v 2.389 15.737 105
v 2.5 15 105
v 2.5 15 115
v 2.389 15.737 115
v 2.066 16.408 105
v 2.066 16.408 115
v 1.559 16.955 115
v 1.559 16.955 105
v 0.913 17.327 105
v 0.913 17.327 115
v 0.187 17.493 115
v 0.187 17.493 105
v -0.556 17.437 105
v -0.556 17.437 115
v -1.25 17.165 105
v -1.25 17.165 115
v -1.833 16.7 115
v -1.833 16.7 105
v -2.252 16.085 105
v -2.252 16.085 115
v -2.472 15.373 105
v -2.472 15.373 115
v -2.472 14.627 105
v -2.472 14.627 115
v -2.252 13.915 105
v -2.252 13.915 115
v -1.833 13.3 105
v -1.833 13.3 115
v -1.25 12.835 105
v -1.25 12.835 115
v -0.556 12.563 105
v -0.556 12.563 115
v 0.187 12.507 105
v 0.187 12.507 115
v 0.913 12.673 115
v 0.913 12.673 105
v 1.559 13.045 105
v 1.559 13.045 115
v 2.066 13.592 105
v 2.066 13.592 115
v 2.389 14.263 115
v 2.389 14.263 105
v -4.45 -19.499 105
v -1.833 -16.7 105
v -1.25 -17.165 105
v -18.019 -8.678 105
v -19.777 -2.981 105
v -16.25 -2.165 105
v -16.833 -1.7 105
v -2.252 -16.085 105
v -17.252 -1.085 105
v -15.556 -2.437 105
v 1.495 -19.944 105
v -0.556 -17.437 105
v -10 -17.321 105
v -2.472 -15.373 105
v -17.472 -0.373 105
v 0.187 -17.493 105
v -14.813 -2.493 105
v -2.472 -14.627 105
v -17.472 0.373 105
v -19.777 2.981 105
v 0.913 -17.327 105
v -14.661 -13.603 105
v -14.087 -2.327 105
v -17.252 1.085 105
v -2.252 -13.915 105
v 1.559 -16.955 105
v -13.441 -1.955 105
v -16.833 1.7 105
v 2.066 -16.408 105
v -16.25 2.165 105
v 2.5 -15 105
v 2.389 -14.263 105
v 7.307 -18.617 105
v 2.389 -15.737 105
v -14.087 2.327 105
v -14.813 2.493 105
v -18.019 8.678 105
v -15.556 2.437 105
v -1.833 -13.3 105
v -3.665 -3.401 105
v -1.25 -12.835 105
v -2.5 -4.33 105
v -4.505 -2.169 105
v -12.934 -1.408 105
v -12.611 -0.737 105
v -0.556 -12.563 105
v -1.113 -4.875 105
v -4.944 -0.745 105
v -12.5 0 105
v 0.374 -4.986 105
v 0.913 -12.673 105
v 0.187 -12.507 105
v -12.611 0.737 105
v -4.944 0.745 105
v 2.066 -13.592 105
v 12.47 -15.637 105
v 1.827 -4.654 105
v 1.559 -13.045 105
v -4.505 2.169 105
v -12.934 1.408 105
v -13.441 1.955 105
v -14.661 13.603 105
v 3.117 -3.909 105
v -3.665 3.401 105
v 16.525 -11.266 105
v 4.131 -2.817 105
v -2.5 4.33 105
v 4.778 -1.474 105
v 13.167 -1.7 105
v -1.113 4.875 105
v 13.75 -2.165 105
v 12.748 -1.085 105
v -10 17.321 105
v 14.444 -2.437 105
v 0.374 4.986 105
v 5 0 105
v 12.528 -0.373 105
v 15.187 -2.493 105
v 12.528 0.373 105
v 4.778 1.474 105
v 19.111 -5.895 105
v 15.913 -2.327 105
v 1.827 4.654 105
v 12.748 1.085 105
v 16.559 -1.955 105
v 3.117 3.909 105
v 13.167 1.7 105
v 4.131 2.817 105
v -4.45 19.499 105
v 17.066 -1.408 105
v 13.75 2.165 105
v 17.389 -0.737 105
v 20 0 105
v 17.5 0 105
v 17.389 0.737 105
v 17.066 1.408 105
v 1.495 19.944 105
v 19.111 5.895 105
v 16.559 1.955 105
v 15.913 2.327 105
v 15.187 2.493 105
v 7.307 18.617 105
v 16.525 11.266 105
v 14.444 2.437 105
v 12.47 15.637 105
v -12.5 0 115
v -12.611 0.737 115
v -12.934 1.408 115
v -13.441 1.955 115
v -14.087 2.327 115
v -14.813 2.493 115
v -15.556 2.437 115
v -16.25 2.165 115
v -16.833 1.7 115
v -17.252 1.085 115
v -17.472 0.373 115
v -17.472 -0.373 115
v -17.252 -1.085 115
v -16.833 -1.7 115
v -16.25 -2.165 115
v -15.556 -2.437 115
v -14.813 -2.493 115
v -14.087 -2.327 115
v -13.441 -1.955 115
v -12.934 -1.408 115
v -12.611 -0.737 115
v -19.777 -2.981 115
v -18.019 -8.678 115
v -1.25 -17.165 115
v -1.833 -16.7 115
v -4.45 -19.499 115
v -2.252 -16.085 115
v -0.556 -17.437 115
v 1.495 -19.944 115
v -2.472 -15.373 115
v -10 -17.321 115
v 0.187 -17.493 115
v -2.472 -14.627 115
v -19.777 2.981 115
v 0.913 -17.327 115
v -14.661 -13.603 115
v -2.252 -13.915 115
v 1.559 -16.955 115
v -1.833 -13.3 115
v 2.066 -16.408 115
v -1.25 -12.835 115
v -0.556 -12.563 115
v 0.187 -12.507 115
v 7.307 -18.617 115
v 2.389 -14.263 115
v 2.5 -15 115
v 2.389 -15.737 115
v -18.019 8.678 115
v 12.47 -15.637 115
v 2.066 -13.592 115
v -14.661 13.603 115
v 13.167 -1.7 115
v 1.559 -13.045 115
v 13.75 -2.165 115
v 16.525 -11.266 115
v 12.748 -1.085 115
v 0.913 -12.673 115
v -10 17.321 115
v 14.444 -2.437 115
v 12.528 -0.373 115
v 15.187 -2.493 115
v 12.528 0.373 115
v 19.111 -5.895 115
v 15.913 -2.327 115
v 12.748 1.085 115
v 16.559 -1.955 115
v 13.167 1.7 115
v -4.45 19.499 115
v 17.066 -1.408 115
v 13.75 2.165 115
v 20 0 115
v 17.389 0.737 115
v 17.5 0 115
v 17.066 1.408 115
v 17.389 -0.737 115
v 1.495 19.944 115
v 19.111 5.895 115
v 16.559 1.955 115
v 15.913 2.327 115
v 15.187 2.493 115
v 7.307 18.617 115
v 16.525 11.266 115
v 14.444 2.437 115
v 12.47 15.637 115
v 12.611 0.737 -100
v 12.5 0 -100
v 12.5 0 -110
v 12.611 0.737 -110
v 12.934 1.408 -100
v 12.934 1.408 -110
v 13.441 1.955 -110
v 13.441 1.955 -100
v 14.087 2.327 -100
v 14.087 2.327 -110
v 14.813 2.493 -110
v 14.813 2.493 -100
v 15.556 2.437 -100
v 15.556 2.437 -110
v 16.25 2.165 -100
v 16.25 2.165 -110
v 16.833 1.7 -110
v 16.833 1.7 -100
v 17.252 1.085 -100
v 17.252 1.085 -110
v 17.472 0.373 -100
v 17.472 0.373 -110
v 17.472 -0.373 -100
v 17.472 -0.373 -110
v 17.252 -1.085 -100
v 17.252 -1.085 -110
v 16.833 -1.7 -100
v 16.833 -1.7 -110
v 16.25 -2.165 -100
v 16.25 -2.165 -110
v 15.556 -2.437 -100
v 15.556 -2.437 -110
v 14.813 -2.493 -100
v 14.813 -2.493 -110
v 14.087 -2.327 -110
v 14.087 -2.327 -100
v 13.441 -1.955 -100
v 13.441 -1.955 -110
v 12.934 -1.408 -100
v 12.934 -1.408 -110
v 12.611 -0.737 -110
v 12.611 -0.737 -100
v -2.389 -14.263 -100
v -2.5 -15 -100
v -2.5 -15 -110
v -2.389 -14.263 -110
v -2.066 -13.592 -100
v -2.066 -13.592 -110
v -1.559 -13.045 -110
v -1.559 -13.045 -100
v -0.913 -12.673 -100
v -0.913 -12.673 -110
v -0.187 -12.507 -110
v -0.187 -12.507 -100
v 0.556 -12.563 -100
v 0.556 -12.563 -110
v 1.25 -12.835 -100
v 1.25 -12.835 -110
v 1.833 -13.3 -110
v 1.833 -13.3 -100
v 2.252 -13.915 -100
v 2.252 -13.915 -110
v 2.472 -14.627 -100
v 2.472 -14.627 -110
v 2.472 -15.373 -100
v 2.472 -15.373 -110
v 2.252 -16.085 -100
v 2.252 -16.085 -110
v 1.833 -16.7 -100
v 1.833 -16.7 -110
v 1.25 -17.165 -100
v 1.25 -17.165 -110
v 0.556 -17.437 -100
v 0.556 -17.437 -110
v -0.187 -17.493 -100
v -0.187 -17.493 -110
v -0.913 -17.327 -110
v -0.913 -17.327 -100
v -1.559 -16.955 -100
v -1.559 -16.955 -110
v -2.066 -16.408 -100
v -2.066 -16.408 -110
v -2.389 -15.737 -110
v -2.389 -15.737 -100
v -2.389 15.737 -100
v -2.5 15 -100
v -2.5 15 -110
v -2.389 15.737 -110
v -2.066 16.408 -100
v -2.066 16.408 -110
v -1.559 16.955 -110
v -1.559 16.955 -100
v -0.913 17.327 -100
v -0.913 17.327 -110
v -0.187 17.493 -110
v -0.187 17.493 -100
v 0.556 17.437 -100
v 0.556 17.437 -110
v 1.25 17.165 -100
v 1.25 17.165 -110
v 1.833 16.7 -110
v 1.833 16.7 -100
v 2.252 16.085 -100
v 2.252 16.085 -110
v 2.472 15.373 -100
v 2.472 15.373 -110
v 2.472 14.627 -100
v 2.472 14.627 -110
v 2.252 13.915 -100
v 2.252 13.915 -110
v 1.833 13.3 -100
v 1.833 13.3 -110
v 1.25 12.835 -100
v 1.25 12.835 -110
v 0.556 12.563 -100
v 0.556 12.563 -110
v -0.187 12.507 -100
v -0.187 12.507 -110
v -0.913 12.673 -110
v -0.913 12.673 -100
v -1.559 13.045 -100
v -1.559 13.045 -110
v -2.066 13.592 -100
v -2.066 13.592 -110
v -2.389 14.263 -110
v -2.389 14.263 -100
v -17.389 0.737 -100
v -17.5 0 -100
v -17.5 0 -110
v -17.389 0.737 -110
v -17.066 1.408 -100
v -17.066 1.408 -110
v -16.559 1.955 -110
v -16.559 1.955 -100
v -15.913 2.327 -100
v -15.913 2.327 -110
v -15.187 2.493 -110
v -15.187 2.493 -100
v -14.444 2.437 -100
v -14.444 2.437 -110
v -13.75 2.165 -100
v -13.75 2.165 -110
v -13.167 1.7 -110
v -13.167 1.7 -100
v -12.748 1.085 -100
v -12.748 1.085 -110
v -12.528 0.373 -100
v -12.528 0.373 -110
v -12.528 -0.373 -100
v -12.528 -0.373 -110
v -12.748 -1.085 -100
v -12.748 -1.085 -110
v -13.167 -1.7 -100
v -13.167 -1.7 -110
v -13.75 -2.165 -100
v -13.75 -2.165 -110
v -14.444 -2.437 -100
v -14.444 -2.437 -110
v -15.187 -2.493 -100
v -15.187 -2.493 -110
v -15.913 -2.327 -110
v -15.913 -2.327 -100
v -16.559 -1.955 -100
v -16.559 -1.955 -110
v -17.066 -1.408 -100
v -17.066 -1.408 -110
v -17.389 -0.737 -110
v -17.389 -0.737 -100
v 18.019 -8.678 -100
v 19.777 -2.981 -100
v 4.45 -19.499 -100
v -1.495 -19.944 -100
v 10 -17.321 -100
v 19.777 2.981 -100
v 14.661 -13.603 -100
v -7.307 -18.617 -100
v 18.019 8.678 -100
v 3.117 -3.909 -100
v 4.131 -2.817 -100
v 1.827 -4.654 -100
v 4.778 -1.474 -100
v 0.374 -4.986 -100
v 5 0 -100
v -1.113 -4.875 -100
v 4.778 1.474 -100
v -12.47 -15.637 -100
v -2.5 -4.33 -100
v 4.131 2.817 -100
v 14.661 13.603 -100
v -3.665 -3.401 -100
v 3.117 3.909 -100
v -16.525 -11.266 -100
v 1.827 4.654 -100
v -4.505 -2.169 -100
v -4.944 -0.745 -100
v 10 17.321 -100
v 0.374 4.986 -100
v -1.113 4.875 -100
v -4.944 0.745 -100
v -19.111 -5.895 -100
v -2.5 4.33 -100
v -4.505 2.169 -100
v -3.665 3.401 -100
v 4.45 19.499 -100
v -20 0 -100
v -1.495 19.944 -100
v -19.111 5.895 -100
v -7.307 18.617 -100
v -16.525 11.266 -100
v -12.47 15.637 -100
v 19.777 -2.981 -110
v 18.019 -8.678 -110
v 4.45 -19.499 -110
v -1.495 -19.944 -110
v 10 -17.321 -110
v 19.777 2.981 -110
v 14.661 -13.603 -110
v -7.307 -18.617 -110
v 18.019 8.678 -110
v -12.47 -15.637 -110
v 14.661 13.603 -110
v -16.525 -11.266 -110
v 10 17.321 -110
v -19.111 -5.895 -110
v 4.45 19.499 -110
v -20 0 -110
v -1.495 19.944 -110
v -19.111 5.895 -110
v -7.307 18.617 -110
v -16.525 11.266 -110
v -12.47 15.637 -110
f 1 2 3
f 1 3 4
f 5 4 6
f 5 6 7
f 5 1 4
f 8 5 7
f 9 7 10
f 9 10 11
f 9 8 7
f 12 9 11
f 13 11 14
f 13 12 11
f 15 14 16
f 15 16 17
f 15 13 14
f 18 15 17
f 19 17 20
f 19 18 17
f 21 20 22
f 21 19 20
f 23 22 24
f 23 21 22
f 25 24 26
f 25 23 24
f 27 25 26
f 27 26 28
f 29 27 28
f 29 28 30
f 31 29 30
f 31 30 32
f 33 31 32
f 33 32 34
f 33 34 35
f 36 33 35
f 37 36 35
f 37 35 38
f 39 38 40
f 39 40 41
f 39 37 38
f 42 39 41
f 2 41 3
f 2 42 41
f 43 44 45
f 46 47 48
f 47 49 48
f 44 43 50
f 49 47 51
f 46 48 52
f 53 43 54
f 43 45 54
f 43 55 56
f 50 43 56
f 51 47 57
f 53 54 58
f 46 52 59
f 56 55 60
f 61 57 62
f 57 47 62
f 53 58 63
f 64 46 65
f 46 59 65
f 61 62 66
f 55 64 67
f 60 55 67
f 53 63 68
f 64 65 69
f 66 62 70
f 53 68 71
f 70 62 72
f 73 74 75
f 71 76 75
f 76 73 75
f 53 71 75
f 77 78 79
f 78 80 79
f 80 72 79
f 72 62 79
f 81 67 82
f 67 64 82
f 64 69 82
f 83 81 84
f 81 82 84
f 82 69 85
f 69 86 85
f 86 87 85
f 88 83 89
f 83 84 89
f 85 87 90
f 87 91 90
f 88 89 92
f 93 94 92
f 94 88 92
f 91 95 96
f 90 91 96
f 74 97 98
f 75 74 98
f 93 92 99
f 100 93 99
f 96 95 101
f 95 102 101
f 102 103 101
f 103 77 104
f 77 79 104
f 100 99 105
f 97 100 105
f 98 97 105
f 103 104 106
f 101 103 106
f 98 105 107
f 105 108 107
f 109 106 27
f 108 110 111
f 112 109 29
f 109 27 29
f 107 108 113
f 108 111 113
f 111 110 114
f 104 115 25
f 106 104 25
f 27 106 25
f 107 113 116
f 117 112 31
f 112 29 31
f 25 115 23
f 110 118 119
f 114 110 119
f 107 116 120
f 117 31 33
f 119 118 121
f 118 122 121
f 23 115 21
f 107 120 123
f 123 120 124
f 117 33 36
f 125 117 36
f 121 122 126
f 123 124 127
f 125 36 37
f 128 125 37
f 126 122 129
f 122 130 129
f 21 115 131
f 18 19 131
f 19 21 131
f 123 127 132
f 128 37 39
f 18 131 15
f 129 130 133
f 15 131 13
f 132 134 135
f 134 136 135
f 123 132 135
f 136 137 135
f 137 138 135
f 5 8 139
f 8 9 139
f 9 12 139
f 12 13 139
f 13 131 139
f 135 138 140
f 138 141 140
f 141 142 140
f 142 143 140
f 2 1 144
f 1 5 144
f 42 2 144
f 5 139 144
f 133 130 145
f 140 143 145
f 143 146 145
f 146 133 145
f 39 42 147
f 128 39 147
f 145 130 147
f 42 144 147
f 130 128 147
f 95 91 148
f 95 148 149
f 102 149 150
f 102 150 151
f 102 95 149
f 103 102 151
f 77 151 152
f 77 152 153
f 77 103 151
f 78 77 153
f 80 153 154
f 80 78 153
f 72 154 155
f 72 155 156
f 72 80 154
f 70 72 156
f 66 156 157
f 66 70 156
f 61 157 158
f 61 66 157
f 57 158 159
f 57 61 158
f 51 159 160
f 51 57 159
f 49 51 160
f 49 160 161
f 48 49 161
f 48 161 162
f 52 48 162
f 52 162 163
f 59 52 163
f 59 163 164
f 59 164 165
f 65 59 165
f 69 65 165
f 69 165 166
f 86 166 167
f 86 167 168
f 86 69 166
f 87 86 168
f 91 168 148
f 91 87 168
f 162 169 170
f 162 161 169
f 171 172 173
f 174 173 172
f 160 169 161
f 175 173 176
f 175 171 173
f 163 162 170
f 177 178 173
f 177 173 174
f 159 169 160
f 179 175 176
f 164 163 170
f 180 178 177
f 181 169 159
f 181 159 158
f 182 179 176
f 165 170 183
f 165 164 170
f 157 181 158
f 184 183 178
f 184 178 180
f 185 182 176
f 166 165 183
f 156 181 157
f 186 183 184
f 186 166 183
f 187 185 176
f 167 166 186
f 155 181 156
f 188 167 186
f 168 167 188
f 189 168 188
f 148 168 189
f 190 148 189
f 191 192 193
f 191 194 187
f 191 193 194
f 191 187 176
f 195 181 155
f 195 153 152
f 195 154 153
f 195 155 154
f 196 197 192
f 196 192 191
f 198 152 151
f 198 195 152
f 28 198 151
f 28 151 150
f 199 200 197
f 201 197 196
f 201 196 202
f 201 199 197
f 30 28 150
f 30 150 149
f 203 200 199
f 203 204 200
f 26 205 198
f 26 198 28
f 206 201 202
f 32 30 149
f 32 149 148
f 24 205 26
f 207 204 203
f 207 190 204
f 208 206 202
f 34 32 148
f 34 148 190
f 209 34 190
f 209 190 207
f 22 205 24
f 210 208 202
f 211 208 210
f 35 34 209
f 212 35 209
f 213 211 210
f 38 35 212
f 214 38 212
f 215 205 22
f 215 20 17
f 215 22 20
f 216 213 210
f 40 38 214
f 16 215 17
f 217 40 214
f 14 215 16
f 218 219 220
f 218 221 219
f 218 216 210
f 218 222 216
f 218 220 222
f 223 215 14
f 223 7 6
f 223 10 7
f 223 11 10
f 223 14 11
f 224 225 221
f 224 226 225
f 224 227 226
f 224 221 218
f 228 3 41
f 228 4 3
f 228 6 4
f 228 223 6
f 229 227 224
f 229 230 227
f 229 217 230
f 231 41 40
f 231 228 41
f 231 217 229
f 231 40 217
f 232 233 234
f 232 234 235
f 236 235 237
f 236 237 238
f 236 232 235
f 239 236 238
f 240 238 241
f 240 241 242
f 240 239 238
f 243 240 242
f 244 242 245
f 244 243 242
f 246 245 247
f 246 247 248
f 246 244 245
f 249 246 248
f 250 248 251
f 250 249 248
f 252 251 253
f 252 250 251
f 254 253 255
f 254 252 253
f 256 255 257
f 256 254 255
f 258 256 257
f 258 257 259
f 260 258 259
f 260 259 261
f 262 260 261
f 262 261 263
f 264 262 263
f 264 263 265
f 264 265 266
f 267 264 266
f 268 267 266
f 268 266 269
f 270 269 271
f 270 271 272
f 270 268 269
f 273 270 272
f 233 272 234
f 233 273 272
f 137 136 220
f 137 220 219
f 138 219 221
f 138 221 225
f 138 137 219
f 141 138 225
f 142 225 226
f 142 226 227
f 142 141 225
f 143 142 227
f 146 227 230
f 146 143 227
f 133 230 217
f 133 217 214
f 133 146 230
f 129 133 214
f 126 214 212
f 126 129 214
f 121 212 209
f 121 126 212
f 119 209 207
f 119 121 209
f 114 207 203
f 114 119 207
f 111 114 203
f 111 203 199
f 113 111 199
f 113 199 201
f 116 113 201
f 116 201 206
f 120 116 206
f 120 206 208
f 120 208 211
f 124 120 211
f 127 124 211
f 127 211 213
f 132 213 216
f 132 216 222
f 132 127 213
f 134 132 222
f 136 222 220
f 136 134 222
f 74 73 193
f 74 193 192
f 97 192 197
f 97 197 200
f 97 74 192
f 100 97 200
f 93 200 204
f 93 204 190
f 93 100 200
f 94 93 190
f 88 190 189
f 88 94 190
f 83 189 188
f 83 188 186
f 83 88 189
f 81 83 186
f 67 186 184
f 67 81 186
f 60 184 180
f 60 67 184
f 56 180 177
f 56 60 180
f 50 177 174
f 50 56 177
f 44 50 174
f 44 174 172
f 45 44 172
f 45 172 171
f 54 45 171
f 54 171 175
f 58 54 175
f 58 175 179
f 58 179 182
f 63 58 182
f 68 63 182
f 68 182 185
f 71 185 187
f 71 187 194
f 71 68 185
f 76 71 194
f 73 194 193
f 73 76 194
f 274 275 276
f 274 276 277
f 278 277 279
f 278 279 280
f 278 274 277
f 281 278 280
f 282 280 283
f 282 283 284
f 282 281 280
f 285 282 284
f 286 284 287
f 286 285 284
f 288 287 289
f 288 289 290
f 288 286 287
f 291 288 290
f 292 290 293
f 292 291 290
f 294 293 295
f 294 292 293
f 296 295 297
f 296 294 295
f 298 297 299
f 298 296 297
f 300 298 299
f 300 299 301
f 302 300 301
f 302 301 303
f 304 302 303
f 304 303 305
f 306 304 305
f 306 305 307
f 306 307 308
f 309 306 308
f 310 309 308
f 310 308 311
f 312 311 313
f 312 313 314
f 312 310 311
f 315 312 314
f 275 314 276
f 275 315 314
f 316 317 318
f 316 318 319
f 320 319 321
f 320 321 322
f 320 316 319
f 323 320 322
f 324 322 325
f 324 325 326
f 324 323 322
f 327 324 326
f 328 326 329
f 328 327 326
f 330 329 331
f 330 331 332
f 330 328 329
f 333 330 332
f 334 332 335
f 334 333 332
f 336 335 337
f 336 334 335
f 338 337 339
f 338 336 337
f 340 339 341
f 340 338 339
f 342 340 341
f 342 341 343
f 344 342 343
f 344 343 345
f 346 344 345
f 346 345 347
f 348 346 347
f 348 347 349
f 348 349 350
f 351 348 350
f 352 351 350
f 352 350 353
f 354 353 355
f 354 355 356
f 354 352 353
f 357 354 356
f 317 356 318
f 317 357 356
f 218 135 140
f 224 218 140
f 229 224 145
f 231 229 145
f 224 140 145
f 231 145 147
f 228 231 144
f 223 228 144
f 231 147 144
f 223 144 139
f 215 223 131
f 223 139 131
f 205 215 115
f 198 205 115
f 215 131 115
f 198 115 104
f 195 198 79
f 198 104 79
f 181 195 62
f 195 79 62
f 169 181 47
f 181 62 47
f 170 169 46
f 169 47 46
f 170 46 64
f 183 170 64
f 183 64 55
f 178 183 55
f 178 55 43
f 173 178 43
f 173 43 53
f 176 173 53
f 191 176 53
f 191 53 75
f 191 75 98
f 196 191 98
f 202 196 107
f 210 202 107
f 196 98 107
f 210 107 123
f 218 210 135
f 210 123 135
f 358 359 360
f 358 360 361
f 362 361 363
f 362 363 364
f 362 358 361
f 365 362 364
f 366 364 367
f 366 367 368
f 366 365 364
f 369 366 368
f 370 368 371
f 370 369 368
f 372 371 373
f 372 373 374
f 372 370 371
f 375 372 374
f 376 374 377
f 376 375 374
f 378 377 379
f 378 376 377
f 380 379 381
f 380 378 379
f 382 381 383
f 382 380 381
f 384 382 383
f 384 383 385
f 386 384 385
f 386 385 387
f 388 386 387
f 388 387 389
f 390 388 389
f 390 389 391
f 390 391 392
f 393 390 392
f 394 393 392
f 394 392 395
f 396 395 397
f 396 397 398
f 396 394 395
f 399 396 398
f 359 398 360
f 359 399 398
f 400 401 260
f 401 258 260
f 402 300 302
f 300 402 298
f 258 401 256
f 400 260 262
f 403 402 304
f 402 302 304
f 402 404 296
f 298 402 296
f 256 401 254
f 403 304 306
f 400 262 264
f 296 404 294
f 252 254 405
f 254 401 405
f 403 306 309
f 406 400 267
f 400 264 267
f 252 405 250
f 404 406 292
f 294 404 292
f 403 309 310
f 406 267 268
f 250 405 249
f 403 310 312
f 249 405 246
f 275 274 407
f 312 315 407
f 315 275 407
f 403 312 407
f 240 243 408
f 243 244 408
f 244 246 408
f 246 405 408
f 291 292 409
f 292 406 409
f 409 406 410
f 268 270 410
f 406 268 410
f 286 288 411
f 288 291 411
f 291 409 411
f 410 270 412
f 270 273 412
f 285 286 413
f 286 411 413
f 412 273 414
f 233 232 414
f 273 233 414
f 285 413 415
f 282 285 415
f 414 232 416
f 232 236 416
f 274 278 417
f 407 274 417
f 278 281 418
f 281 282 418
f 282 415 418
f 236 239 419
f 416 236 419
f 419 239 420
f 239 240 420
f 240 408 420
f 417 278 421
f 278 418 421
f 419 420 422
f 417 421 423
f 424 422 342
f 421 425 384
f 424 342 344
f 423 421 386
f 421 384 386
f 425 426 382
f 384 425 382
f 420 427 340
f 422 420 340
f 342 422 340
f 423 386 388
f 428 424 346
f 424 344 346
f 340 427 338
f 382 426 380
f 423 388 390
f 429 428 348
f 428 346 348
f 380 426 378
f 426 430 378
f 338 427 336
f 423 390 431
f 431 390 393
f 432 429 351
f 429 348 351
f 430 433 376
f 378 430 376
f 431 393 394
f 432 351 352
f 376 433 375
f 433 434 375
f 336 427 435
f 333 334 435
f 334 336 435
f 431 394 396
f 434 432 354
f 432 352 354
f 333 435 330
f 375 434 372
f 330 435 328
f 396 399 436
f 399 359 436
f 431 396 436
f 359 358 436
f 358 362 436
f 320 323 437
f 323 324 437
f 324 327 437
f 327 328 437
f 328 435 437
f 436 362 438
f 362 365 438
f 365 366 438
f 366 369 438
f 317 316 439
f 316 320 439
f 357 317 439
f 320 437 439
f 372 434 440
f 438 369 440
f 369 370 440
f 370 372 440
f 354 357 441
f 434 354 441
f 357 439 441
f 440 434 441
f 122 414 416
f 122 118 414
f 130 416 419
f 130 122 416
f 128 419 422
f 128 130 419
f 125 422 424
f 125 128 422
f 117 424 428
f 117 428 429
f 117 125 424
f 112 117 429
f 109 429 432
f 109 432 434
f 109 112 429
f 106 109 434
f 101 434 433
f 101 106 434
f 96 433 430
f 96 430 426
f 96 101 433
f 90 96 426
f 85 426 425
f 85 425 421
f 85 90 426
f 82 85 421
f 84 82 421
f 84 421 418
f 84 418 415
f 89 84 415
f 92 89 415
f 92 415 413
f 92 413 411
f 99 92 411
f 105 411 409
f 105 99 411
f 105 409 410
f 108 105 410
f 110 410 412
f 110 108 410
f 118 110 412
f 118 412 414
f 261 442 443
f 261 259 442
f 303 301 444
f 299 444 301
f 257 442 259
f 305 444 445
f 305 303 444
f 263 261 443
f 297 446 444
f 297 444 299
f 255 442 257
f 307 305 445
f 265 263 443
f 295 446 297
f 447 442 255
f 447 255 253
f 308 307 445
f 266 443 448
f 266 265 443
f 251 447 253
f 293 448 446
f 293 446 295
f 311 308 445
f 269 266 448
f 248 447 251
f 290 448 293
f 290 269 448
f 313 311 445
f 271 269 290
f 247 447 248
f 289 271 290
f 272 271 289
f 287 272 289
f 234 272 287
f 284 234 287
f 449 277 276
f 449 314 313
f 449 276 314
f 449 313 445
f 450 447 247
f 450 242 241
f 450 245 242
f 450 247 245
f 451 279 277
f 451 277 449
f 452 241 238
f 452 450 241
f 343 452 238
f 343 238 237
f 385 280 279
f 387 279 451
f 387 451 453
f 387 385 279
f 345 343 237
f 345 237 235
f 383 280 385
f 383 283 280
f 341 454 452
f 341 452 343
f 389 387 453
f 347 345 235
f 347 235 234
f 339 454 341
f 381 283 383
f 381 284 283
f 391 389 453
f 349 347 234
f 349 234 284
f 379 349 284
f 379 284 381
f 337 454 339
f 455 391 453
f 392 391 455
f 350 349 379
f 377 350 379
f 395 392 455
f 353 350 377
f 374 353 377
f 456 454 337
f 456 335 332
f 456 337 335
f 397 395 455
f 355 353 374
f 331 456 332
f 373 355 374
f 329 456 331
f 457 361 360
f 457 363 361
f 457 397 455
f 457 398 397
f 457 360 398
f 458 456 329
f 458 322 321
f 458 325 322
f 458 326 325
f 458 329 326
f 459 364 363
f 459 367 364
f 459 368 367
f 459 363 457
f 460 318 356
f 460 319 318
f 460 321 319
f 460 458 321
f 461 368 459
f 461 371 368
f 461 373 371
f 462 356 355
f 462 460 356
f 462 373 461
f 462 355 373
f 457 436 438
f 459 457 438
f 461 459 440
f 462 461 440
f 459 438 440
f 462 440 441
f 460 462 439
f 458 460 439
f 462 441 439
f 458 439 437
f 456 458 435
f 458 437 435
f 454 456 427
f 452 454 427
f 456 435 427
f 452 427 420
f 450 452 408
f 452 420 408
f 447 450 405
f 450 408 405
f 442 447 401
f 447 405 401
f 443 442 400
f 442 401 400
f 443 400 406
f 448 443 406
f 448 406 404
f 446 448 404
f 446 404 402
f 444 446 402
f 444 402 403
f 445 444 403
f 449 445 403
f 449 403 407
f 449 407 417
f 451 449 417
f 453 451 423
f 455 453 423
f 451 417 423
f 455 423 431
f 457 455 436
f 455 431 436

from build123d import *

# Parameters (mm, degrees)
SKETCH1_R                = 5
BOSS_EXTRUDE1_DEPTH      = 105
BOSS_EXTRUDE1_DEPTH_BACK = 100
SKETCH2_R                = 20
SKETCH2_R_2              = 2.5
BOSS_EXTRUDE2_DEPTH      = 10
SKETCH3_R                = 20
SKETCH3_R_2              = 2.5
BOSS_EXTRUDE3_DEPTH      = 10


with BuildPart() as part:
    # Sketch1 → Boss-Extrude1 (new body, two sides)
    with BuildSketch(Plane.XY) as boss_extrude1_sk:
        Circle(SKETCH1_R)
    extrude(amount=BOSS_EXTRUDE1_DEPTH)
    extrude(boss_extrude1_sk.sketch, amount=-BOSS_EXTRUDE1_DEPTH_BACK)

    # Sketch2 → Boss-Extrude2 (add)
    with BuildSketch(Plane.XY.offset(105)):
        Circle(SKETCH2_R)
        with Locations((0, 15)):
            Circle(SKETCH2_R_2, mode=Mode.SUBTRACT)
        with Locations((15, 0)):
            Circle(SKETCH2_R_2, mode=Mode.SUBTRACT)
        with Locations((0, -15)):
            Circle(SKETCH2_R_2, mode=Mode.SUBTRACT)
        with Locations((-15, 0)):
            Circle(SKETCH2_R_2, mode=Mode.SUBTRACT)
    extrude(amount=BOSS_EXTRUDE2_DEPTH)

    # Sketch3 → Boss-Extrude3 (add)
    with BuildSketch(Plane(origin=(0, 0, -100), x_dir=(-1, 0, 0), z_dir=(0, 0, -1))):
        Circle(SKETCH3_R)
        with Locations((0, 15)):
            Circle(SKETCH3_R_2, mode=Mode.SUBTRACT)
        with Locations((-15, 0)):
            Circle(SKETCH3_R_2, mode=Mode.SUBTRACT)
        with Locations((0, -15)):
            Circle(SKETCH3_R_2, mode=Mode.SUBTRACT)
        with Locations((15, 0)):
            Circle(SKETCH3_R_2, mode=Mode.SUBTRACT)
    extrude(amount=BOSS_EXTRUDE3_DEPTH)


solid = part.part
